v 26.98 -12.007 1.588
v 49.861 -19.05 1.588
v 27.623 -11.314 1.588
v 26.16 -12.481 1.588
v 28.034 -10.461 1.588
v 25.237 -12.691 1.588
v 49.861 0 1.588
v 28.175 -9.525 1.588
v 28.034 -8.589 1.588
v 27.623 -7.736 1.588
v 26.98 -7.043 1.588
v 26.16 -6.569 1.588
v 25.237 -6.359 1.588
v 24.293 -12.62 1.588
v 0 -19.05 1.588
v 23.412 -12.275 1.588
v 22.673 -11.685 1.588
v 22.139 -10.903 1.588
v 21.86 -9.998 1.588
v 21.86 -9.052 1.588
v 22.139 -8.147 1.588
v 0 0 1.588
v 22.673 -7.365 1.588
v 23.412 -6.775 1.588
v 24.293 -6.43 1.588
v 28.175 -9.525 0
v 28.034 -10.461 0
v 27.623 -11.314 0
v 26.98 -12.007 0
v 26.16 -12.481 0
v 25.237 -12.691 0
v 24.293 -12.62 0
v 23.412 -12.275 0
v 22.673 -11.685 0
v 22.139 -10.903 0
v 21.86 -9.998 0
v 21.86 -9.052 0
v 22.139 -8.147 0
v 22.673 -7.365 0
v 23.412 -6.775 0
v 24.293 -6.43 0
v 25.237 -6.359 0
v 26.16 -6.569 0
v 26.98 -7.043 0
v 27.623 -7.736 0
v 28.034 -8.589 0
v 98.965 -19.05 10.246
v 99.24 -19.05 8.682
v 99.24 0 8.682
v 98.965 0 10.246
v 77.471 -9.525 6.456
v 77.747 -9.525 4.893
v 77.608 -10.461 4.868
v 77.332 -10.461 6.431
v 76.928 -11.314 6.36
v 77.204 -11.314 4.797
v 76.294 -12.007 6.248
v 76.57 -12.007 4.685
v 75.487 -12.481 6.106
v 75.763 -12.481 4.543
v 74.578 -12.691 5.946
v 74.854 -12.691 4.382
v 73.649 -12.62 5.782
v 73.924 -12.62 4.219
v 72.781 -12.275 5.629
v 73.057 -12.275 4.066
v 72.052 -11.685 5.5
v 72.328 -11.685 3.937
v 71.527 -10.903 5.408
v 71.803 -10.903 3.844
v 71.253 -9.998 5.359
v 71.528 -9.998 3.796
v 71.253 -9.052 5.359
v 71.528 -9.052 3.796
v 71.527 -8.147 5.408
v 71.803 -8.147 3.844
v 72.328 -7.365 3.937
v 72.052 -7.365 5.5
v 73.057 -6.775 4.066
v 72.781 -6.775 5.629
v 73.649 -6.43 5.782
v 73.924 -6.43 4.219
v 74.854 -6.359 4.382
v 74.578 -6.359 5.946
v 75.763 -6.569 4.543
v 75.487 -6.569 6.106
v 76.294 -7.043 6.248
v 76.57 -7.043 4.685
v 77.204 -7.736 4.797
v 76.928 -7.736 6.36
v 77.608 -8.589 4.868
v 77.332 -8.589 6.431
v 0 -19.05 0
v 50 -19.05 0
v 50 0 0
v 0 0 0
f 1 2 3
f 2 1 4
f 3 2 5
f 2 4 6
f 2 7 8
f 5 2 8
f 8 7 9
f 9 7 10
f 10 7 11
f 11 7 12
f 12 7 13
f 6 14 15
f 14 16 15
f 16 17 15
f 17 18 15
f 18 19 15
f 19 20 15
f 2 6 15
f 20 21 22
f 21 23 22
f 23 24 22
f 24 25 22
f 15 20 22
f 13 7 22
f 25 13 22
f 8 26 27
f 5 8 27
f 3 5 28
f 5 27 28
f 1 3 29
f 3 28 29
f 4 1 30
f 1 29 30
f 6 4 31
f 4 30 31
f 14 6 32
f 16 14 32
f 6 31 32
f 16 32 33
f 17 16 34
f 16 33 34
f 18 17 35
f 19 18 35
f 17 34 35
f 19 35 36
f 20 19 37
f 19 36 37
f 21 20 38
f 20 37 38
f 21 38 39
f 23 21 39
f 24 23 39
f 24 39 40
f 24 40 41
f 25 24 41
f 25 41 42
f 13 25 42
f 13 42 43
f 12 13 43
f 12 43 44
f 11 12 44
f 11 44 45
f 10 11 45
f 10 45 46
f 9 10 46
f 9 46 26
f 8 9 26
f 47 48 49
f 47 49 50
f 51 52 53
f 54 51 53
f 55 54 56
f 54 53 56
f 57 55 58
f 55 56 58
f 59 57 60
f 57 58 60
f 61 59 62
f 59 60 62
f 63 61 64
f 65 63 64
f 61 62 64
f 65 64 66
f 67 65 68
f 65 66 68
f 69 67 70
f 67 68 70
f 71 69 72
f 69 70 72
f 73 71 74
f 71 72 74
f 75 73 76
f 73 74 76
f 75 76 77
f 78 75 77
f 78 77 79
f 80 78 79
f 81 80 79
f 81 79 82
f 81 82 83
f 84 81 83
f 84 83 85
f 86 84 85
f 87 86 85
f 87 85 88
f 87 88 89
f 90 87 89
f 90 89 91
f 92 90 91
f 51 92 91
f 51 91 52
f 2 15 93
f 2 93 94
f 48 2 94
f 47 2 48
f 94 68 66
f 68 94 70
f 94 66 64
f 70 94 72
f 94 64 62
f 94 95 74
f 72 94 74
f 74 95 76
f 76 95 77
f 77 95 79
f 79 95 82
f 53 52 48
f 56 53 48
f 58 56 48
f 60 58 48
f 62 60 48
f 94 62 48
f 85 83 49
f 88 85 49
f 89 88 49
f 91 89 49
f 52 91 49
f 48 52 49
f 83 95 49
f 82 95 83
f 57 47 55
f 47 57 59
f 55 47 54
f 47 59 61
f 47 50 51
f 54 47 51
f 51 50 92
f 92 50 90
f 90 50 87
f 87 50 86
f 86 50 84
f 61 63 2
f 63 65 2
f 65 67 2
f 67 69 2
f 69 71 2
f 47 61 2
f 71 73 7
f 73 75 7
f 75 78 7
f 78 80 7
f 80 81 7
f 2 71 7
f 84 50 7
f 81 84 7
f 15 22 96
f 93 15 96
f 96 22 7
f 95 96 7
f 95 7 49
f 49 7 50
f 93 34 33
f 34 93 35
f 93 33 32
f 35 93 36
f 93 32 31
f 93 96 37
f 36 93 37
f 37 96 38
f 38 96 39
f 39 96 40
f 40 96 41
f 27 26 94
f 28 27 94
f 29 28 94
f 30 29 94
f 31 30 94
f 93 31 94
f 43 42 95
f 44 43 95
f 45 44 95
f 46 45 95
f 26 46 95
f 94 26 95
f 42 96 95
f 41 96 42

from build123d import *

# Parameters (mm, degrees)
F1_DEPTH = 19.05
F2_R     = 3.175
F3_DEPTH = 25
F4_R     = 3.175
F5_DEPTH = 25


with BuildPart() as f1:
    # F0 (on Front) → F1 (new body)
    with BuildSketch(Plane.XZ):
        Polygon((0, 1.5875), (0, 0), (50, 0), (99.2403876506, 8.6824088833), (98.9647211686, 10.2457911913), (49.8611117467, 1.5875), align=None)
    extrude(amount=F1_DEPTH)

    # F2 (on face) → F3 (cut)
    with BuildSketch(Plane(origin=(0, 0, 0), x_dir=(1, 0, 0), z_dir=(0, 0, -1))):
        with Locations((25, 9.525)):
            Circle(F2_R)
    extrude(amount=-F3_DEPTH, mode=Mode.SUBTRACT)

    # F4 (on face) → F5 (cut)
    with BuildSketch(Plane(origin=(1.5076844804, 0, -8.5505035831), x_dir=(0.984807753, 0, 0.1736481777), z_dir=(0.1736481777, 0, -0.984807753))):
        with Locations((74.2403876506, 9.525)):
            Circle(F4_R)
    extrude(amount=-F5_DEPTH, mode=Mode.SUBTRACT)


solid = f1.part
